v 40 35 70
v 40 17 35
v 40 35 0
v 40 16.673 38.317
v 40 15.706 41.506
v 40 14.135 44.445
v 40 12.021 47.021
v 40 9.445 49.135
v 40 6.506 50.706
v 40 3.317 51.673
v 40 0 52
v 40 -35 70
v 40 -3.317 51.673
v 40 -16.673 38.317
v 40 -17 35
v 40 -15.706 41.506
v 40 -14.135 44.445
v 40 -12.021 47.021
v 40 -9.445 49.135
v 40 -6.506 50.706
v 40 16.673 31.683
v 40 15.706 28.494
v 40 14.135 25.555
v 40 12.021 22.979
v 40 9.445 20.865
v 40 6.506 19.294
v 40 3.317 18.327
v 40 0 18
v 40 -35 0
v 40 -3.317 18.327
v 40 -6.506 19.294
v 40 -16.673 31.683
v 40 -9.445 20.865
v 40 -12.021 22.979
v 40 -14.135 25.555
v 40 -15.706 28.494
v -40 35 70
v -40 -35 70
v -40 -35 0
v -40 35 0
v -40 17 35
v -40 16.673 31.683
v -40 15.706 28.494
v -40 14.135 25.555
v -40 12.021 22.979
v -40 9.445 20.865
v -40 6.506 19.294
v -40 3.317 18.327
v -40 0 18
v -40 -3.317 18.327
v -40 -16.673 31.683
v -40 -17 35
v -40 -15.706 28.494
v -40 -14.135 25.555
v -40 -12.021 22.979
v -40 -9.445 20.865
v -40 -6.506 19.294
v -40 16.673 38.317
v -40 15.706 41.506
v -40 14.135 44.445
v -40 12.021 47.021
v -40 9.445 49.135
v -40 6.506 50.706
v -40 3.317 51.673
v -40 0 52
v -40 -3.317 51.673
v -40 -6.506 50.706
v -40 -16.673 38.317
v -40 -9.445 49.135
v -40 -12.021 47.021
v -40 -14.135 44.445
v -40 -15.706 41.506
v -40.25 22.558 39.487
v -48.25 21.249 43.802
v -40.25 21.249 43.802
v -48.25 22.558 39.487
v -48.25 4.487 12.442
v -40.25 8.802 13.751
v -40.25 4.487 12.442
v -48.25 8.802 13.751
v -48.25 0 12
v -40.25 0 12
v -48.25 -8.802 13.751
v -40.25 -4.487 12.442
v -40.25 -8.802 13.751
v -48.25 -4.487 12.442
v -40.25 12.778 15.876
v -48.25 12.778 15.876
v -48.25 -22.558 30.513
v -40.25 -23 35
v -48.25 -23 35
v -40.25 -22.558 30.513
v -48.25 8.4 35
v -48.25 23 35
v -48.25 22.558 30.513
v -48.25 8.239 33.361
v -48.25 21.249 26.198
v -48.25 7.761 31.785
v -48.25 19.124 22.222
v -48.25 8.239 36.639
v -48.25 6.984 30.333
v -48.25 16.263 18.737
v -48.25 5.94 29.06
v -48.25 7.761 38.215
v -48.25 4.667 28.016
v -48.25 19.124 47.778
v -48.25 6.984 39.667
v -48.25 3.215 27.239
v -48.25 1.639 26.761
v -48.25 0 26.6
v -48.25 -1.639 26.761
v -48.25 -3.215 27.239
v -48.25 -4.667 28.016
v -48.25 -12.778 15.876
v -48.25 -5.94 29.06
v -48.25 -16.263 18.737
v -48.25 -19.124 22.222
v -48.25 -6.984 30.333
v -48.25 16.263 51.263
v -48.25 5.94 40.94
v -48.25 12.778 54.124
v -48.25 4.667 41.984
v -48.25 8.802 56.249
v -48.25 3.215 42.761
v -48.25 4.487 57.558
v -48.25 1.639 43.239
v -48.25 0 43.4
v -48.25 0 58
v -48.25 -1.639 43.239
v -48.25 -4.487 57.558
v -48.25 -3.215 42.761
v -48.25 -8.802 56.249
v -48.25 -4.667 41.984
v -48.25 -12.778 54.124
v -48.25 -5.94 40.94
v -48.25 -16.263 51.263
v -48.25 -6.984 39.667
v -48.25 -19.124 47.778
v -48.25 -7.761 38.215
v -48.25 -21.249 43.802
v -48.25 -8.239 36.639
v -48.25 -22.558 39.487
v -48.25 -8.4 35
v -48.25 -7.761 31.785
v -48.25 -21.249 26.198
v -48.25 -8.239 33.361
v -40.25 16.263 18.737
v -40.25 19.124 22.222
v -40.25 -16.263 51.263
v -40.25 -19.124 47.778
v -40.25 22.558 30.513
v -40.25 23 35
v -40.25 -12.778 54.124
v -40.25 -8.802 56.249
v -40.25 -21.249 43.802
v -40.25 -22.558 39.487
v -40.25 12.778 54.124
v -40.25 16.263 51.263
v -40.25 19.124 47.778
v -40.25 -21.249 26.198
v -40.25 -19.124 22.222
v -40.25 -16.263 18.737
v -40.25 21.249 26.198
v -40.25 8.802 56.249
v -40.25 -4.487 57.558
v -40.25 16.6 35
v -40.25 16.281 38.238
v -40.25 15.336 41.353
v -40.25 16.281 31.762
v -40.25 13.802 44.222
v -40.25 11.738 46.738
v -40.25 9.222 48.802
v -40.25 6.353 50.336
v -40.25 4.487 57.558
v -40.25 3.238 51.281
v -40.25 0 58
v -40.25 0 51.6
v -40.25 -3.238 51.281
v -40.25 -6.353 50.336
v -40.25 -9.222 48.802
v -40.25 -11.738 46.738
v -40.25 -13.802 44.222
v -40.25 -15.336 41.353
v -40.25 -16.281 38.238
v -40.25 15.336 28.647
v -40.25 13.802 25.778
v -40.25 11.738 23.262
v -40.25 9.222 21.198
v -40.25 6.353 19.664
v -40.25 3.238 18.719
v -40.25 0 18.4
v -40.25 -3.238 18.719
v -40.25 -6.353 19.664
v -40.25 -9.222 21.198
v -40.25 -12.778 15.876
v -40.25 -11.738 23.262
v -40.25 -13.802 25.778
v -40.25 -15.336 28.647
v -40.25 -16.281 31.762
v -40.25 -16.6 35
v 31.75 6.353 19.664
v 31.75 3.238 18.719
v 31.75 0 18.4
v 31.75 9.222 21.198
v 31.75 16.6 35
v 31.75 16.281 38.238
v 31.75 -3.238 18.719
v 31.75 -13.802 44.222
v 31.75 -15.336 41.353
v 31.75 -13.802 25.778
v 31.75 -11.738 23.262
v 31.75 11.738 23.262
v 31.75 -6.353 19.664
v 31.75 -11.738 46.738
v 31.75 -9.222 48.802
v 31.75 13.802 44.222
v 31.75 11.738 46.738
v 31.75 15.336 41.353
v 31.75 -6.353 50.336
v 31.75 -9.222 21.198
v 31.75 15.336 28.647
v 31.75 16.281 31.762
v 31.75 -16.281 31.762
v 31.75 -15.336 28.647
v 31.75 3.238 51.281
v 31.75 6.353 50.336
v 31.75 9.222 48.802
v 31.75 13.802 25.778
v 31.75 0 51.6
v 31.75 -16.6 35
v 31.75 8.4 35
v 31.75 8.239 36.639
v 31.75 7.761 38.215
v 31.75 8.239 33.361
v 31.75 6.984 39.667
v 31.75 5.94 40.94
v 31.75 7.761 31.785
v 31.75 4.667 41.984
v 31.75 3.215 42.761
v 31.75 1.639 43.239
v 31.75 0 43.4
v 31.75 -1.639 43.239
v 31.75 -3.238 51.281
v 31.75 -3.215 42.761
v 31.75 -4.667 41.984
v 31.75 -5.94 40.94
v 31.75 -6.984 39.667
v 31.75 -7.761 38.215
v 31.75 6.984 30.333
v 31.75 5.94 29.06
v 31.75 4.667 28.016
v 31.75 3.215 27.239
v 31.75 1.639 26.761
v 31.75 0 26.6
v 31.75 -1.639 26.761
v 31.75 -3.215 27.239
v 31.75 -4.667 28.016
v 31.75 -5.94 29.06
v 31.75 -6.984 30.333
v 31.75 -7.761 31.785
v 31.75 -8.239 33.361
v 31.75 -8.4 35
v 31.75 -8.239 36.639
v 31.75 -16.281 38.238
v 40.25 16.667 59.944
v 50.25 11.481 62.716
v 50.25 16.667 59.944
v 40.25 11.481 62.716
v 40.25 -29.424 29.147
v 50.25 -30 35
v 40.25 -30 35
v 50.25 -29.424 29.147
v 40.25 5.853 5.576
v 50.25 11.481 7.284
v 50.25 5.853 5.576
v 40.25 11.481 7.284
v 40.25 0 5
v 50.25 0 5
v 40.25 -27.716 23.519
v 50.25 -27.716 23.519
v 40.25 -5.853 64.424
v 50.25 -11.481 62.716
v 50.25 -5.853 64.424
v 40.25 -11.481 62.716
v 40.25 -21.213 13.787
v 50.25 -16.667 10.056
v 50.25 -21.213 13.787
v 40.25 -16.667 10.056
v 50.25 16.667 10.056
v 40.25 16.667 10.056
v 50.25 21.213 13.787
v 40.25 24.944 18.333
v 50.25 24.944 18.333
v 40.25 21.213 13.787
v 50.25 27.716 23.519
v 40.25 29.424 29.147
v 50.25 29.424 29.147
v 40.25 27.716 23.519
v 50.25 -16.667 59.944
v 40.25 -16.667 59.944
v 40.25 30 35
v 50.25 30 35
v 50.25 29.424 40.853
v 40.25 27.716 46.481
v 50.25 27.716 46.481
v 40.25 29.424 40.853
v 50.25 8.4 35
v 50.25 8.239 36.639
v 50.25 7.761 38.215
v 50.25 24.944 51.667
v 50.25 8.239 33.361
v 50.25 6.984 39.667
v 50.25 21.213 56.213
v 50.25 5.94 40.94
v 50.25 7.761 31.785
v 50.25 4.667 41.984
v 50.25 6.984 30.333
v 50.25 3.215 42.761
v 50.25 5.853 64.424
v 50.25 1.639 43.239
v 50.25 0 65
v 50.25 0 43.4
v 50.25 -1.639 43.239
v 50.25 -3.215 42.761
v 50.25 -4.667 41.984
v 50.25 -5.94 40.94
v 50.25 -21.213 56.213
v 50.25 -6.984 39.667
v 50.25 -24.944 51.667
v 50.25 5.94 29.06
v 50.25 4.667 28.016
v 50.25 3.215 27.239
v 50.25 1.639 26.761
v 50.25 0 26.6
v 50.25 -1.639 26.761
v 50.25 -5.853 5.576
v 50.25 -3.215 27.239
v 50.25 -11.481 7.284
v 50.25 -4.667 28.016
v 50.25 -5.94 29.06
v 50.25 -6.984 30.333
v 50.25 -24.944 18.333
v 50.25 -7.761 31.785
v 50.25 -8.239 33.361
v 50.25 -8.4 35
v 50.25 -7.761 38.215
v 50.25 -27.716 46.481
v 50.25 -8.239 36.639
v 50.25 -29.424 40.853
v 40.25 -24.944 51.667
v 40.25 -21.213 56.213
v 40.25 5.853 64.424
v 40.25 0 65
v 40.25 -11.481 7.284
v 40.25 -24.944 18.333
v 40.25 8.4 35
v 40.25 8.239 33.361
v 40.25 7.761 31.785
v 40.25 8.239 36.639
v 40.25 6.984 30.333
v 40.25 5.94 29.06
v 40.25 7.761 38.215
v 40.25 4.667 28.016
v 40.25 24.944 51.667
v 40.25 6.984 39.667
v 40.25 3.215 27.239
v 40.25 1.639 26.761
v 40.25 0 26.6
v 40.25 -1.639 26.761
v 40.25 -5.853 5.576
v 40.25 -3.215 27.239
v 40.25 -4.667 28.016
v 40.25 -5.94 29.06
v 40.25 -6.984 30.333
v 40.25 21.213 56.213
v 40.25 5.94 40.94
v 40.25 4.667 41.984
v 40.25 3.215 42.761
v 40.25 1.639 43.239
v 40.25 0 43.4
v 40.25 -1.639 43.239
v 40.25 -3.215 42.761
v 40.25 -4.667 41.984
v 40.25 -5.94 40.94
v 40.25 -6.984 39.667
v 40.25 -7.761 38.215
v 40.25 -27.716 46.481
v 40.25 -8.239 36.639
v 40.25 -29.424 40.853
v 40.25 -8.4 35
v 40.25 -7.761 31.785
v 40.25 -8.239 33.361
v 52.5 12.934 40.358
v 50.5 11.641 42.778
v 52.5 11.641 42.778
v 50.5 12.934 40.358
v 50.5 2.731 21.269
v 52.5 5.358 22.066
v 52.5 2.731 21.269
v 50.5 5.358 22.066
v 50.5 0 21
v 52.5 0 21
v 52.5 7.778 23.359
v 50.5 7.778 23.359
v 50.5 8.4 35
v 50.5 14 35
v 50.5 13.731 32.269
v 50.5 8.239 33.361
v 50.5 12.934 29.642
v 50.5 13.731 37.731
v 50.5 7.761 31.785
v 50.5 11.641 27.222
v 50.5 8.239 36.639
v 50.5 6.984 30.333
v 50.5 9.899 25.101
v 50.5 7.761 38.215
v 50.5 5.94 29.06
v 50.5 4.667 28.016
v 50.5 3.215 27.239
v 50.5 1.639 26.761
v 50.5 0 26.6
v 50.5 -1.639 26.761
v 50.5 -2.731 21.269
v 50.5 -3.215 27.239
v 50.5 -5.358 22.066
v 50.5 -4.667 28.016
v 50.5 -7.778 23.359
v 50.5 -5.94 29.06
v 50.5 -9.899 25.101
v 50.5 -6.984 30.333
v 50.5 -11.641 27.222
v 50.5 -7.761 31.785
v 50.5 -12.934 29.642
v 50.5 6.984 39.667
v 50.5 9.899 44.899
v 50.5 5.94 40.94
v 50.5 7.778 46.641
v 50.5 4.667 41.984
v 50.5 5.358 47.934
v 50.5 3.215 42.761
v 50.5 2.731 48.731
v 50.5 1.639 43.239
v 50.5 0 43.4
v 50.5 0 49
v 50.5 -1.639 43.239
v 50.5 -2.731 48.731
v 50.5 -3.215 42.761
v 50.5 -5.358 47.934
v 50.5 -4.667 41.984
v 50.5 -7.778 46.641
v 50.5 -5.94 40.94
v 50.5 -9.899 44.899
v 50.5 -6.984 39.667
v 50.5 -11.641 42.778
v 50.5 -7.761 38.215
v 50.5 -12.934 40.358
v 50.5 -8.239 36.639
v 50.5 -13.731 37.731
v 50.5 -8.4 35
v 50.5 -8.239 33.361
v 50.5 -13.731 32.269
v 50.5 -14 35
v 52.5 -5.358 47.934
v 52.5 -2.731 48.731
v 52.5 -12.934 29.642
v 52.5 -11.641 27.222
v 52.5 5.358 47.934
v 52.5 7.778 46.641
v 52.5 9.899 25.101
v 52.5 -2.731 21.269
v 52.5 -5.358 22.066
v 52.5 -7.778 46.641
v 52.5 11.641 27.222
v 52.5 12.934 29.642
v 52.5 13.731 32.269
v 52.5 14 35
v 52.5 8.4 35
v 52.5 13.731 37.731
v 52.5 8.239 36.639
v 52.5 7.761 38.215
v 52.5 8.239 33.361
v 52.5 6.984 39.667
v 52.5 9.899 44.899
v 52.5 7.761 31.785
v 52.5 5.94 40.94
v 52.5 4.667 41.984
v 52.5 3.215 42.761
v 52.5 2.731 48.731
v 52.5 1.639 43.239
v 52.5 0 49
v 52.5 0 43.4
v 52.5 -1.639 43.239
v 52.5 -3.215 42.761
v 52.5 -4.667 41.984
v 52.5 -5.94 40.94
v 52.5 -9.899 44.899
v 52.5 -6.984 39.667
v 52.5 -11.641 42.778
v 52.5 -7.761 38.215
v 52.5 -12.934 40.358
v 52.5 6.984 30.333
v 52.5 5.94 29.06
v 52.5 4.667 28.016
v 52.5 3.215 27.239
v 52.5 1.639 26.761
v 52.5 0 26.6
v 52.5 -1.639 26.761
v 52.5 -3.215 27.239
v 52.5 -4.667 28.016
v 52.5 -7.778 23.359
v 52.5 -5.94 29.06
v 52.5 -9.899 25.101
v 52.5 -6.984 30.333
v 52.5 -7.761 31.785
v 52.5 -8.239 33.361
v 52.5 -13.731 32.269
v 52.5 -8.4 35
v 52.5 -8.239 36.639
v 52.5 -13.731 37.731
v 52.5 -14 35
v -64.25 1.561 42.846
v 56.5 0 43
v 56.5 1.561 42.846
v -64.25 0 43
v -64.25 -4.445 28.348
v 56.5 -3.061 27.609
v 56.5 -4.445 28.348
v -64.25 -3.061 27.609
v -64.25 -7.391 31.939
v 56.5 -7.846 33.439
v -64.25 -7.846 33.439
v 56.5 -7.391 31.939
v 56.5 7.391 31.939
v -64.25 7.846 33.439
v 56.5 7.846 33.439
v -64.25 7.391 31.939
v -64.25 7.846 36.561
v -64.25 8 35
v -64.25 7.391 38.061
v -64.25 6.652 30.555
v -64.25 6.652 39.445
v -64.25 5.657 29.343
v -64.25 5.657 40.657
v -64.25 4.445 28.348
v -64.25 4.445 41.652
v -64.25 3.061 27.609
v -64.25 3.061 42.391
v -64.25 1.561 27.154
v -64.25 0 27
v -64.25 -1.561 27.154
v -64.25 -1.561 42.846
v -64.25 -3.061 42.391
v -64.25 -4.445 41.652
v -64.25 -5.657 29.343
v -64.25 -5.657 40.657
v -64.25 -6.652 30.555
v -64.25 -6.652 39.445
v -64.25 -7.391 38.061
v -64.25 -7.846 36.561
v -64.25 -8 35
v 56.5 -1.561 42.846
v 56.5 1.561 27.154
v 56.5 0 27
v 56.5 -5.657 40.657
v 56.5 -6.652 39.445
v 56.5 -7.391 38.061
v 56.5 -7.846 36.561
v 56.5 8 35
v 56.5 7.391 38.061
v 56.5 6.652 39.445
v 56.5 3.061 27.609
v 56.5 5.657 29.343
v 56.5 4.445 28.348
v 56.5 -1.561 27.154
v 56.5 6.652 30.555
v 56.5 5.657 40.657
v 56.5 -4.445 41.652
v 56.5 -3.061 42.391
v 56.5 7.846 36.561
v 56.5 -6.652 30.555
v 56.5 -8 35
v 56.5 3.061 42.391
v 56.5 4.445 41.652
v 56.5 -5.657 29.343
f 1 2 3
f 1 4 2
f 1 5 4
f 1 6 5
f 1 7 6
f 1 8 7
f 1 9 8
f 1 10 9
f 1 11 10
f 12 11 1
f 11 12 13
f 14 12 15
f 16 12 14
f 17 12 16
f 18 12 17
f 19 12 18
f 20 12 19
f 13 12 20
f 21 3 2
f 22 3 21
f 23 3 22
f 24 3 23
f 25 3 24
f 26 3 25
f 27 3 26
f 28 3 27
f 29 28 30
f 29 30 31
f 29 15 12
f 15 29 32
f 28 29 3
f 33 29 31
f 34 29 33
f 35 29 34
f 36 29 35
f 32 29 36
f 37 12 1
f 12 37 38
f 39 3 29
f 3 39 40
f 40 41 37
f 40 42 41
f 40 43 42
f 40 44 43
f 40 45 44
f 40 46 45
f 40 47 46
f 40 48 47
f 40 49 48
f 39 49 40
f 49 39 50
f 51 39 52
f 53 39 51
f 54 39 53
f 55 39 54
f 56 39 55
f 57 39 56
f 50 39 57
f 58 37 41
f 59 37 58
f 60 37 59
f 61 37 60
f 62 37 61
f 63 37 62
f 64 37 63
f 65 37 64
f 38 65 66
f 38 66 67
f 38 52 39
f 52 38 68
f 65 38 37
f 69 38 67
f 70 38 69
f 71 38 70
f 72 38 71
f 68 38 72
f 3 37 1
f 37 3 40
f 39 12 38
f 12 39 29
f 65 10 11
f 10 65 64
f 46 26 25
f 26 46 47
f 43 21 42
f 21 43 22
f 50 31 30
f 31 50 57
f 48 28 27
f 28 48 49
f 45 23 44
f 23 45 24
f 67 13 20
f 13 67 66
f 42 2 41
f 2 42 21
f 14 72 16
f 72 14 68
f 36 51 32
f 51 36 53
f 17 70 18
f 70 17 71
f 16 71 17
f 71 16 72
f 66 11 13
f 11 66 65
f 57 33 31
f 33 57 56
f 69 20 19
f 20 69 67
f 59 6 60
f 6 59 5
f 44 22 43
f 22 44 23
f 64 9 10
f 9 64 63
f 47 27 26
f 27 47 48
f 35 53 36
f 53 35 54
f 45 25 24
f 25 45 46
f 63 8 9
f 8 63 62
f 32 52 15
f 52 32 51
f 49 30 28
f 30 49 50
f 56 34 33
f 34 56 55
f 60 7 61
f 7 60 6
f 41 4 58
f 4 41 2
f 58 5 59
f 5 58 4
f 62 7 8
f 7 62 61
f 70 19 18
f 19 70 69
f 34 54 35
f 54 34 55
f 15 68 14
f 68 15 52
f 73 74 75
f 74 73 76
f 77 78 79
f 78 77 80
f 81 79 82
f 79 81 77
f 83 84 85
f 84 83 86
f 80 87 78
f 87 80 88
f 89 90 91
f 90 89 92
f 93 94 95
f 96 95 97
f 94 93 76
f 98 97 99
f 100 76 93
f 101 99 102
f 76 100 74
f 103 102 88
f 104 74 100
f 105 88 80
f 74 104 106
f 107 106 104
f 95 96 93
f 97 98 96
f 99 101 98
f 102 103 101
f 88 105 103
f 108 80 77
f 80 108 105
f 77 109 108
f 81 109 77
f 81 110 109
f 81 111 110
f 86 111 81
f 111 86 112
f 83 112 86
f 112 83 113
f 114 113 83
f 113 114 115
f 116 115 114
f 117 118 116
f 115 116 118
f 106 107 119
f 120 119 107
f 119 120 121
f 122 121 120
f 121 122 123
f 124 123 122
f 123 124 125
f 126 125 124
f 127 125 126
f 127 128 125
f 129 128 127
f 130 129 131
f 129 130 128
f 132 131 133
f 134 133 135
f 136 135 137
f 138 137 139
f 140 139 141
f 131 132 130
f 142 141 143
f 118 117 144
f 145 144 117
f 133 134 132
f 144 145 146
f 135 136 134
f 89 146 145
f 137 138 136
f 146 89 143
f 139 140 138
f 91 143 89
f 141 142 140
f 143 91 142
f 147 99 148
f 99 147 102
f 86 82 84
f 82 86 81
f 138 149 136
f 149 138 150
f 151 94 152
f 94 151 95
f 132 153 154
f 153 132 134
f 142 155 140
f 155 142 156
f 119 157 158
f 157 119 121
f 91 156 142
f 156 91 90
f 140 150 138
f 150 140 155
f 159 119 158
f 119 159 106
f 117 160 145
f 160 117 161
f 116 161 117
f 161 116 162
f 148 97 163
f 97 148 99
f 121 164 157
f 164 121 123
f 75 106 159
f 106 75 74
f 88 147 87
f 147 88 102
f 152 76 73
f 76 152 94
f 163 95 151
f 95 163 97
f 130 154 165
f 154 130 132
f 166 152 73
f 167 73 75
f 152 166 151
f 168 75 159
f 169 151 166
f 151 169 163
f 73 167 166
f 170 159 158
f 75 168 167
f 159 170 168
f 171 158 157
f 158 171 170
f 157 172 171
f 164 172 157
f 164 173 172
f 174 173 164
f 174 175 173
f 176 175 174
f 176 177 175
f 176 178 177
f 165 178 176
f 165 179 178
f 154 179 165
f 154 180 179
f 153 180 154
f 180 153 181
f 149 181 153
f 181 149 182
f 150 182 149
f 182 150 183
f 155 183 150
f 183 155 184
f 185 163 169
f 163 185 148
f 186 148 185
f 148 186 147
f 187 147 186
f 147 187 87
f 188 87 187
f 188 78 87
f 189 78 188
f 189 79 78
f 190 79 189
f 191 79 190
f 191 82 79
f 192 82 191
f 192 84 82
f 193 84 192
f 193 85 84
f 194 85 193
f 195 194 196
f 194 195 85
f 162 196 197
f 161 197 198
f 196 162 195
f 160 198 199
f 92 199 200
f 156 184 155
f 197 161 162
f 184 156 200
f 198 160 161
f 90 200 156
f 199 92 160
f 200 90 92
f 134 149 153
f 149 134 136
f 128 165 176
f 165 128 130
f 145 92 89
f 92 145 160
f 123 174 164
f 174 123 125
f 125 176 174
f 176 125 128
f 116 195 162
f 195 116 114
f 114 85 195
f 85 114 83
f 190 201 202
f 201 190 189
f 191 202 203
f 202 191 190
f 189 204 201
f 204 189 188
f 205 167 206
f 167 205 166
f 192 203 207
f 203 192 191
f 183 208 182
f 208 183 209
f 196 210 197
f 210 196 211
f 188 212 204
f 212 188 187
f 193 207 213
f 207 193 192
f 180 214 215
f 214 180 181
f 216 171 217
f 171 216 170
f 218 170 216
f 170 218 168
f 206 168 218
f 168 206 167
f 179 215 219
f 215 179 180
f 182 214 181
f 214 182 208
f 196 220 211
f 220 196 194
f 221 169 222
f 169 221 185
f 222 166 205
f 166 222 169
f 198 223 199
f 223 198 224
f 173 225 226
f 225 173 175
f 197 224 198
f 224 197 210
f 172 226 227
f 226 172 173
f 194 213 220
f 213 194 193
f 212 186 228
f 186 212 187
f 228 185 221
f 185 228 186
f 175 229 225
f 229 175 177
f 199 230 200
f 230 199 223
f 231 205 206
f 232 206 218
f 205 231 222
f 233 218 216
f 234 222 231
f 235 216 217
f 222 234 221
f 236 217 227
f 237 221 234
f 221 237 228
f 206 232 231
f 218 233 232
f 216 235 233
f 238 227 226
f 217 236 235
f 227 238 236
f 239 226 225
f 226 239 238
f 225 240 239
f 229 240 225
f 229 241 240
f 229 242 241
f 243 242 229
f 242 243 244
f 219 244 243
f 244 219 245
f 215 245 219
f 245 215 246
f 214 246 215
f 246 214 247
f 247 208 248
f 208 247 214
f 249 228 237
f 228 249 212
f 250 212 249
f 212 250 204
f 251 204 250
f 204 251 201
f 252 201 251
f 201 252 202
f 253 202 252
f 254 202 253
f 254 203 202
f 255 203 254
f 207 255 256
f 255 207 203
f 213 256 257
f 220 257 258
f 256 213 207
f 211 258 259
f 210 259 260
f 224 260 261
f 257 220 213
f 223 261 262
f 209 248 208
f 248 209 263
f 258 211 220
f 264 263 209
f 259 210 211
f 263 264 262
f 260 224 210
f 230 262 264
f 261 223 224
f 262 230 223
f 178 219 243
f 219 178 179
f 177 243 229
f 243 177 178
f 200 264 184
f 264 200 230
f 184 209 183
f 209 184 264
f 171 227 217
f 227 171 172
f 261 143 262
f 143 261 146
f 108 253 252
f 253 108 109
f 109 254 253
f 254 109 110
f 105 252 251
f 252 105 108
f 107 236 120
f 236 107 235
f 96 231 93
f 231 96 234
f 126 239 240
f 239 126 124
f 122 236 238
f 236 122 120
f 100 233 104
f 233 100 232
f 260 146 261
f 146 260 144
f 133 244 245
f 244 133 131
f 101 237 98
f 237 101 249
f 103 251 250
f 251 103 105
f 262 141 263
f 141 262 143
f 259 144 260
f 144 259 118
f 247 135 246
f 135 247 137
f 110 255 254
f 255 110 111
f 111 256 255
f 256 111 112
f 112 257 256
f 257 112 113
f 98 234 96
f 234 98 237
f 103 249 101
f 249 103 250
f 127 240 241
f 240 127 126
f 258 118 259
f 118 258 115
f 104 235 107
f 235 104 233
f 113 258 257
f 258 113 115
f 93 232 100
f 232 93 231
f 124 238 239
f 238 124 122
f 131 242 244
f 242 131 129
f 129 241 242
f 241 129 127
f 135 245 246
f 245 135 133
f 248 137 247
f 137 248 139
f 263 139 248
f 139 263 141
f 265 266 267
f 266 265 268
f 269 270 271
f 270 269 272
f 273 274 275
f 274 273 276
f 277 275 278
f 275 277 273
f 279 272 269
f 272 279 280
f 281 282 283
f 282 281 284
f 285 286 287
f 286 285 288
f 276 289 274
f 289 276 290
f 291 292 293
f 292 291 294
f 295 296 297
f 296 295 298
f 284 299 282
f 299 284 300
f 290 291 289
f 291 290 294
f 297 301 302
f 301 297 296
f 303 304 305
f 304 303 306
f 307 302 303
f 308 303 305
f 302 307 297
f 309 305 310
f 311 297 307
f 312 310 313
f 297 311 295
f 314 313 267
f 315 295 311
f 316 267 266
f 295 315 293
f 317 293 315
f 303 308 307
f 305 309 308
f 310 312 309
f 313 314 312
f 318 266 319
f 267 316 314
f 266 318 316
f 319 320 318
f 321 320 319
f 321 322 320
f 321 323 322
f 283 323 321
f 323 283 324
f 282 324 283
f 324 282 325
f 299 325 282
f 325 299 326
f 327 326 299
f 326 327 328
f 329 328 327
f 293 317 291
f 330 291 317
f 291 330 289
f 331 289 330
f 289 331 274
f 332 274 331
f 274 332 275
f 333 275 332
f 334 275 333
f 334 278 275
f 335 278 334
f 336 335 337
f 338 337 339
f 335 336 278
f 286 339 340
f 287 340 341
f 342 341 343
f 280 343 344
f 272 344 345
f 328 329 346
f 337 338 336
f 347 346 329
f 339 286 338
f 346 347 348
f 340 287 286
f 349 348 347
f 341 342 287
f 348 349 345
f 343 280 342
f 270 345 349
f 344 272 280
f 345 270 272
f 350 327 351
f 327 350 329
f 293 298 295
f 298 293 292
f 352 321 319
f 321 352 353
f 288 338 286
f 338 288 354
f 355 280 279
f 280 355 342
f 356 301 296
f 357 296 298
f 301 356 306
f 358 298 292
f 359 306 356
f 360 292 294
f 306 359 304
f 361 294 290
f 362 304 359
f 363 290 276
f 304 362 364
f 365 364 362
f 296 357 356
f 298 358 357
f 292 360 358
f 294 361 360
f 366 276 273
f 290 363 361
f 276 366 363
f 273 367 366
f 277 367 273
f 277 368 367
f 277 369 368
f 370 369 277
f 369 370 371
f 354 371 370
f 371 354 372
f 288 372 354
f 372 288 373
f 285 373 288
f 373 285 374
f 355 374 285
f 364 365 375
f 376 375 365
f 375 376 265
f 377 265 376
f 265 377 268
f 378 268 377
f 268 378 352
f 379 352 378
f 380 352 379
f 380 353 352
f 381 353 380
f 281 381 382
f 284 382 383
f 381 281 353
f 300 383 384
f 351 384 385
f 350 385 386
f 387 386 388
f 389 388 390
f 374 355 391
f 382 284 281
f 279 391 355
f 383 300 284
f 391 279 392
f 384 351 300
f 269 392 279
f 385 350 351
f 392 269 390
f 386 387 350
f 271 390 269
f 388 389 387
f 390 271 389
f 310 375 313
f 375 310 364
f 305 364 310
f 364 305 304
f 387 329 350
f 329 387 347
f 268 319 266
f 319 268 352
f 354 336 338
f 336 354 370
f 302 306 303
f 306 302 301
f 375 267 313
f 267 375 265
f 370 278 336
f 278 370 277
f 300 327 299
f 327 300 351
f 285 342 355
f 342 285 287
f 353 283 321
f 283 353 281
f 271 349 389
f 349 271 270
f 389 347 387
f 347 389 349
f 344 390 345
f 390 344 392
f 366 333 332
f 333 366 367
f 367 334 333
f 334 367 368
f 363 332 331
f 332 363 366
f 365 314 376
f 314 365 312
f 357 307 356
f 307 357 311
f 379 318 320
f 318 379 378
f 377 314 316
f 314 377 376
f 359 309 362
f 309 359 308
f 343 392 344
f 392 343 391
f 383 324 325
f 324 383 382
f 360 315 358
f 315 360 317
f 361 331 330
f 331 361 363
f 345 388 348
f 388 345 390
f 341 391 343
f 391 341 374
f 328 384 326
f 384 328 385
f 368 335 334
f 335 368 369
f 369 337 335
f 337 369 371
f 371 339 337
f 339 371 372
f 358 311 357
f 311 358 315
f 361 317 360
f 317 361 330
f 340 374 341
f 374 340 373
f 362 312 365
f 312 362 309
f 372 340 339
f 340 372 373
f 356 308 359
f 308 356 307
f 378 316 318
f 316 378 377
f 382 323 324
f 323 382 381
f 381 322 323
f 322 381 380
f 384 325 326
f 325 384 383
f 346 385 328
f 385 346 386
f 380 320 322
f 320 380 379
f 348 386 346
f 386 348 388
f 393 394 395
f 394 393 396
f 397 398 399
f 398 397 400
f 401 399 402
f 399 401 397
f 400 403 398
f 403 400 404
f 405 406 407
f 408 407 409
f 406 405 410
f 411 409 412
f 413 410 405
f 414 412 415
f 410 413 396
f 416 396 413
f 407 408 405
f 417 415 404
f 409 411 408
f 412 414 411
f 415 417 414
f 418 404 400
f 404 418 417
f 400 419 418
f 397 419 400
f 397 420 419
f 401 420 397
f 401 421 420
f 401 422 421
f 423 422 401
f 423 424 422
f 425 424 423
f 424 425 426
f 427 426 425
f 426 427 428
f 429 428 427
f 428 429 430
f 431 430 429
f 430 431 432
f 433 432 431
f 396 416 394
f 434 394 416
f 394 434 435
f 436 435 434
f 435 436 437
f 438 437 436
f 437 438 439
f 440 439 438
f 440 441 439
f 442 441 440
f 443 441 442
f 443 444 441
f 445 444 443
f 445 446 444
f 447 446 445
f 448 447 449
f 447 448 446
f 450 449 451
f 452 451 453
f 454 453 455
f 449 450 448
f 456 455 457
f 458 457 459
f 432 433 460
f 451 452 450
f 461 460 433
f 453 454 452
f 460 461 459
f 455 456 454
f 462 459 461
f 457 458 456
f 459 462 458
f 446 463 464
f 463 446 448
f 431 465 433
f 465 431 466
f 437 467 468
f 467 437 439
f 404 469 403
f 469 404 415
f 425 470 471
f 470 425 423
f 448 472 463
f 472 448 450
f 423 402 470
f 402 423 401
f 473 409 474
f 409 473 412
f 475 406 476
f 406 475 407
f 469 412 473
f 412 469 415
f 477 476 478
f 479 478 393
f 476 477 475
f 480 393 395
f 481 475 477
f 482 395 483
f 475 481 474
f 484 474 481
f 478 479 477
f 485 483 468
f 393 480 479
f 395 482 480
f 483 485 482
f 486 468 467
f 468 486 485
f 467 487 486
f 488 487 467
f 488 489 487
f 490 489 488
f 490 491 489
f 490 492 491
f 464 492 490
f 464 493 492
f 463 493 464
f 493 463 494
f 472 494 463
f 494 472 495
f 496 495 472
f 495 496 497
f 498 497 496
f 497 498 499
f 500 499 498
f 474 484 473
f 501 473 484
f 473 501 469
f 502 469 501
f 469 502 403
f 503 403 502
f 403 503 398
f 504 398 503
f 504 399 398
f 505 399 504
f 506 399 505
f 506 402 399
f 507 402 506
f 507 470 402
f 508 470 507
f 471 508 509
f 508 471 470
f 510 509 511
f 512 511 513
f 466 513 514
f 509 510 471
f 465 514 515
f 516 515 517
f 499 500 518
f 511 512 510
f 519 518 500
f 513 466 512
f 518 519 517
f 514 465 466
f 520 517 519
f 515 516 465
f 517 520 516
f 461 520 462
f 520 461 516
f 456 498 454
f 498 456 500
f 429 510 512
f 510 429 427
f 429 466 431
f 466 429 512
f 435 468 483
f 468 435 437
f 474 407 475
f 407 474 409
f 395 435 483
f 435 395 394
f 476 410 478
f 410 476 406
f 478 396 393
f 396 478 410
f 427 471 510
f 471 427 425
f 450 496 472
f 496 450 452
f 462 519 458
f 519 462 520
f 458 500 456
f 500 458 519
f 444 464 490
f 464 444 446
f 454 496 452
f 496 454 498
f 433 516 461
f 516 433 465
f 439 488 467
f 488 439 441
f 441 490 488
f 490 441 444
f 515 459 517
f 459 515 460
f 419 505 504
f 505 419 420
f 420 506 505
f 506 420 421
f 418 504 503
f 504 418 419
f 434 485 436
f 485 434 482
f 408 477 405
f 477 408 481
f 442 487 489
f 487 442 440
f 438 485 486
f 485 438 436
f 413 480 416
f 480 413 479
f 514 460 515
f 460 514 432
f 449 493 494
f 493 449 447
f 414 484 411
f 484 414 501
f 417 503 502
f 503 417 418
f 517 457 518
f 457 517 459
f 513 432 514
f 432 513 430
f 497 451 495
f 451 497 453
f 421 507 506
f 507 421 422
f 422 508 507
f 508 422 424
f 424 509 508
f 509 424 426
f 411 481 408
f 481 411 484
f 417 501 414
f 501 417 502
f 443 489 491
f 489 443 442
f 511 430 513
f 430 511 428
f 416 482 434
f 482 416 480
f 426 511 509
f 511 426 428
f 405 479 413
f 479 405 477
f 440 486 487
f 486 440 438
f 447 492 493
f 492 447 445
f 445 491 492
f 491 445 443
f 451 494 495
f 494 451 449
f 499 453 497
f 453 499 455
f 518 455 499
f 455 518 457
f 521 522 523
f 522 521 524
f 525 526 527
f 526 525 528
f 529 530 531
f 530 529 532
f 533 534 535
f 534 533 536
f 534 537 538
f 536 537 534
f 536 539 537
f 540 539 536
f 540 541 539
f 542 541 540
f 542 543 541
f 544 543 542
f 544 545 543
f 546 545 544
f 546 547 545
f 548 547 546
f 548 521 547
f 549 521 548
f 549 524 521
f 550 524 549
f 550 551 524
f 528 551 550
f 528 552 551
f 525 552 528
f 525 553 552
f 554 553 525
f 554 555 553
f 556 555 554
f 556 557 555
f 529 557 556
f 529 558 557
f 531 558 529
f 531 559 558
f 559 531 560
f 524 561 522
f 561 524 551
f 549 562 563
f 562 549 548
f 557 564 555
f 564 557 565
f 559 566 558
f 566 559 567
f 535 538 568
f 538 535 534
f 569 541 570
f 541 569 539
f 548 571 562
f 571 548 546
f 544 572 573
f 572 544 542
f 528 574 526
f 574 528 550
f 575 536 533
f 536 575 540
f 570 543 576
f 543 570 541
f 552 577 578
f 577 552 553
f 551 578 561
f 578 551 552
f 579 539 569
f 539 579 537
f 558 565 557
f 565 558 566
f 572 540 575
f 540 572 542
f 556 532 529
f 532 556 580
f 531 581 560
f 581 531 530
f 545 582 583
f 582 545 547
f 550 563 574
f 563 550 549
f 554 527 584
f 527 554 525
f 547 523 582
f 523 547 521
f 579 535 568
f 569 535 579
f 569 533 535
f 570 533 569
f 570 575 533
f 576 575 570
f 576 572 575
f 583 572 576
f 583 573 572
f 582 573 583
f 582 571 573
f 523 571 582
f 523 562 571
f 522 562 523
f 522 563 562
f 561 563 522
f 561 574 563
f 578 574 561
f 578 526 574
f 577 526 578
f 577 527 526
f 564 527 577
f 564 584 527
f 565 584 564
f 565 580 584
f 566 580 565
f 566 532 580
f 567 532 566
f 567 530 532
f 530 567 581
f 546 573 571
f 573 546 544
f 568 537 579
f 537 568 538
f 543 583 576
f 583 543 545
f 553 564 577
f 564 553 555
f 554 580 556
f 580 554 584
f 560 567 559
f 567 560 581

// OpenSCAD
$fn = 32;

// ------------------------------------------------------------------------
// Bushed housing: 80 x 70 x 70 mm housing, bushing d33.2
// Every part is its own module, assembly() places them once.
// ------------------------------------------------------------------------

// --- part 1 ---
module housing() {
  difference() {
    translate([-40, -35, 0]) cube([80, 70, 70]);
    translate([0, 0, 35]) rotate([0, 90, 0]) cylinder(h = 82, d = 34, center = true);
  }
}

// --- part 2 ---
module bushing() {
  difference() {
    union() {
      cylinder(h = 8, d = 46);
      translate([0, 0, 8]) cylinder(h = 72, d = 33.2);
    }
    translate([0, 0, -1]) cylinder(h = 82, d = 16.8);
  }
}

// --- part 3 ---
module shaft() {
  translate([0, 0, -60.375]) cylinder(h = 120.75, d = 16);
}

// --- part 4 ---
module cover() {
  difference() {
    cylinder(h = 10, d = 60);
    translate([0, 0, -1]) cylinder(h = 12, d = 16.8);
  }
}

// --- part 5 ---
module washer() {
  difference() {
      translate([0, 0, 0]) cylinder(h = 2, d = 28);
      translate([0, 0, -1]) cylinder(h = 4, d = 16.8);
    }
}

// --- assembly ---
module assembly() {
  translate([0, 0, 0]) rotate([0, 0, 0]) housing();
  translate([-48.25, 0, 35]) rotate([0, 90, 0]) bushing();
  translate([-3.875, 0, 35]) rotate([0, 90, 0]) shaft();
  translate([40.25, 0, 35]) rotate([0, 90, 0]) cover();
  translate([50.5, 0, 35]) rotate([0, 90, 0]) washer();
}

assembly();
